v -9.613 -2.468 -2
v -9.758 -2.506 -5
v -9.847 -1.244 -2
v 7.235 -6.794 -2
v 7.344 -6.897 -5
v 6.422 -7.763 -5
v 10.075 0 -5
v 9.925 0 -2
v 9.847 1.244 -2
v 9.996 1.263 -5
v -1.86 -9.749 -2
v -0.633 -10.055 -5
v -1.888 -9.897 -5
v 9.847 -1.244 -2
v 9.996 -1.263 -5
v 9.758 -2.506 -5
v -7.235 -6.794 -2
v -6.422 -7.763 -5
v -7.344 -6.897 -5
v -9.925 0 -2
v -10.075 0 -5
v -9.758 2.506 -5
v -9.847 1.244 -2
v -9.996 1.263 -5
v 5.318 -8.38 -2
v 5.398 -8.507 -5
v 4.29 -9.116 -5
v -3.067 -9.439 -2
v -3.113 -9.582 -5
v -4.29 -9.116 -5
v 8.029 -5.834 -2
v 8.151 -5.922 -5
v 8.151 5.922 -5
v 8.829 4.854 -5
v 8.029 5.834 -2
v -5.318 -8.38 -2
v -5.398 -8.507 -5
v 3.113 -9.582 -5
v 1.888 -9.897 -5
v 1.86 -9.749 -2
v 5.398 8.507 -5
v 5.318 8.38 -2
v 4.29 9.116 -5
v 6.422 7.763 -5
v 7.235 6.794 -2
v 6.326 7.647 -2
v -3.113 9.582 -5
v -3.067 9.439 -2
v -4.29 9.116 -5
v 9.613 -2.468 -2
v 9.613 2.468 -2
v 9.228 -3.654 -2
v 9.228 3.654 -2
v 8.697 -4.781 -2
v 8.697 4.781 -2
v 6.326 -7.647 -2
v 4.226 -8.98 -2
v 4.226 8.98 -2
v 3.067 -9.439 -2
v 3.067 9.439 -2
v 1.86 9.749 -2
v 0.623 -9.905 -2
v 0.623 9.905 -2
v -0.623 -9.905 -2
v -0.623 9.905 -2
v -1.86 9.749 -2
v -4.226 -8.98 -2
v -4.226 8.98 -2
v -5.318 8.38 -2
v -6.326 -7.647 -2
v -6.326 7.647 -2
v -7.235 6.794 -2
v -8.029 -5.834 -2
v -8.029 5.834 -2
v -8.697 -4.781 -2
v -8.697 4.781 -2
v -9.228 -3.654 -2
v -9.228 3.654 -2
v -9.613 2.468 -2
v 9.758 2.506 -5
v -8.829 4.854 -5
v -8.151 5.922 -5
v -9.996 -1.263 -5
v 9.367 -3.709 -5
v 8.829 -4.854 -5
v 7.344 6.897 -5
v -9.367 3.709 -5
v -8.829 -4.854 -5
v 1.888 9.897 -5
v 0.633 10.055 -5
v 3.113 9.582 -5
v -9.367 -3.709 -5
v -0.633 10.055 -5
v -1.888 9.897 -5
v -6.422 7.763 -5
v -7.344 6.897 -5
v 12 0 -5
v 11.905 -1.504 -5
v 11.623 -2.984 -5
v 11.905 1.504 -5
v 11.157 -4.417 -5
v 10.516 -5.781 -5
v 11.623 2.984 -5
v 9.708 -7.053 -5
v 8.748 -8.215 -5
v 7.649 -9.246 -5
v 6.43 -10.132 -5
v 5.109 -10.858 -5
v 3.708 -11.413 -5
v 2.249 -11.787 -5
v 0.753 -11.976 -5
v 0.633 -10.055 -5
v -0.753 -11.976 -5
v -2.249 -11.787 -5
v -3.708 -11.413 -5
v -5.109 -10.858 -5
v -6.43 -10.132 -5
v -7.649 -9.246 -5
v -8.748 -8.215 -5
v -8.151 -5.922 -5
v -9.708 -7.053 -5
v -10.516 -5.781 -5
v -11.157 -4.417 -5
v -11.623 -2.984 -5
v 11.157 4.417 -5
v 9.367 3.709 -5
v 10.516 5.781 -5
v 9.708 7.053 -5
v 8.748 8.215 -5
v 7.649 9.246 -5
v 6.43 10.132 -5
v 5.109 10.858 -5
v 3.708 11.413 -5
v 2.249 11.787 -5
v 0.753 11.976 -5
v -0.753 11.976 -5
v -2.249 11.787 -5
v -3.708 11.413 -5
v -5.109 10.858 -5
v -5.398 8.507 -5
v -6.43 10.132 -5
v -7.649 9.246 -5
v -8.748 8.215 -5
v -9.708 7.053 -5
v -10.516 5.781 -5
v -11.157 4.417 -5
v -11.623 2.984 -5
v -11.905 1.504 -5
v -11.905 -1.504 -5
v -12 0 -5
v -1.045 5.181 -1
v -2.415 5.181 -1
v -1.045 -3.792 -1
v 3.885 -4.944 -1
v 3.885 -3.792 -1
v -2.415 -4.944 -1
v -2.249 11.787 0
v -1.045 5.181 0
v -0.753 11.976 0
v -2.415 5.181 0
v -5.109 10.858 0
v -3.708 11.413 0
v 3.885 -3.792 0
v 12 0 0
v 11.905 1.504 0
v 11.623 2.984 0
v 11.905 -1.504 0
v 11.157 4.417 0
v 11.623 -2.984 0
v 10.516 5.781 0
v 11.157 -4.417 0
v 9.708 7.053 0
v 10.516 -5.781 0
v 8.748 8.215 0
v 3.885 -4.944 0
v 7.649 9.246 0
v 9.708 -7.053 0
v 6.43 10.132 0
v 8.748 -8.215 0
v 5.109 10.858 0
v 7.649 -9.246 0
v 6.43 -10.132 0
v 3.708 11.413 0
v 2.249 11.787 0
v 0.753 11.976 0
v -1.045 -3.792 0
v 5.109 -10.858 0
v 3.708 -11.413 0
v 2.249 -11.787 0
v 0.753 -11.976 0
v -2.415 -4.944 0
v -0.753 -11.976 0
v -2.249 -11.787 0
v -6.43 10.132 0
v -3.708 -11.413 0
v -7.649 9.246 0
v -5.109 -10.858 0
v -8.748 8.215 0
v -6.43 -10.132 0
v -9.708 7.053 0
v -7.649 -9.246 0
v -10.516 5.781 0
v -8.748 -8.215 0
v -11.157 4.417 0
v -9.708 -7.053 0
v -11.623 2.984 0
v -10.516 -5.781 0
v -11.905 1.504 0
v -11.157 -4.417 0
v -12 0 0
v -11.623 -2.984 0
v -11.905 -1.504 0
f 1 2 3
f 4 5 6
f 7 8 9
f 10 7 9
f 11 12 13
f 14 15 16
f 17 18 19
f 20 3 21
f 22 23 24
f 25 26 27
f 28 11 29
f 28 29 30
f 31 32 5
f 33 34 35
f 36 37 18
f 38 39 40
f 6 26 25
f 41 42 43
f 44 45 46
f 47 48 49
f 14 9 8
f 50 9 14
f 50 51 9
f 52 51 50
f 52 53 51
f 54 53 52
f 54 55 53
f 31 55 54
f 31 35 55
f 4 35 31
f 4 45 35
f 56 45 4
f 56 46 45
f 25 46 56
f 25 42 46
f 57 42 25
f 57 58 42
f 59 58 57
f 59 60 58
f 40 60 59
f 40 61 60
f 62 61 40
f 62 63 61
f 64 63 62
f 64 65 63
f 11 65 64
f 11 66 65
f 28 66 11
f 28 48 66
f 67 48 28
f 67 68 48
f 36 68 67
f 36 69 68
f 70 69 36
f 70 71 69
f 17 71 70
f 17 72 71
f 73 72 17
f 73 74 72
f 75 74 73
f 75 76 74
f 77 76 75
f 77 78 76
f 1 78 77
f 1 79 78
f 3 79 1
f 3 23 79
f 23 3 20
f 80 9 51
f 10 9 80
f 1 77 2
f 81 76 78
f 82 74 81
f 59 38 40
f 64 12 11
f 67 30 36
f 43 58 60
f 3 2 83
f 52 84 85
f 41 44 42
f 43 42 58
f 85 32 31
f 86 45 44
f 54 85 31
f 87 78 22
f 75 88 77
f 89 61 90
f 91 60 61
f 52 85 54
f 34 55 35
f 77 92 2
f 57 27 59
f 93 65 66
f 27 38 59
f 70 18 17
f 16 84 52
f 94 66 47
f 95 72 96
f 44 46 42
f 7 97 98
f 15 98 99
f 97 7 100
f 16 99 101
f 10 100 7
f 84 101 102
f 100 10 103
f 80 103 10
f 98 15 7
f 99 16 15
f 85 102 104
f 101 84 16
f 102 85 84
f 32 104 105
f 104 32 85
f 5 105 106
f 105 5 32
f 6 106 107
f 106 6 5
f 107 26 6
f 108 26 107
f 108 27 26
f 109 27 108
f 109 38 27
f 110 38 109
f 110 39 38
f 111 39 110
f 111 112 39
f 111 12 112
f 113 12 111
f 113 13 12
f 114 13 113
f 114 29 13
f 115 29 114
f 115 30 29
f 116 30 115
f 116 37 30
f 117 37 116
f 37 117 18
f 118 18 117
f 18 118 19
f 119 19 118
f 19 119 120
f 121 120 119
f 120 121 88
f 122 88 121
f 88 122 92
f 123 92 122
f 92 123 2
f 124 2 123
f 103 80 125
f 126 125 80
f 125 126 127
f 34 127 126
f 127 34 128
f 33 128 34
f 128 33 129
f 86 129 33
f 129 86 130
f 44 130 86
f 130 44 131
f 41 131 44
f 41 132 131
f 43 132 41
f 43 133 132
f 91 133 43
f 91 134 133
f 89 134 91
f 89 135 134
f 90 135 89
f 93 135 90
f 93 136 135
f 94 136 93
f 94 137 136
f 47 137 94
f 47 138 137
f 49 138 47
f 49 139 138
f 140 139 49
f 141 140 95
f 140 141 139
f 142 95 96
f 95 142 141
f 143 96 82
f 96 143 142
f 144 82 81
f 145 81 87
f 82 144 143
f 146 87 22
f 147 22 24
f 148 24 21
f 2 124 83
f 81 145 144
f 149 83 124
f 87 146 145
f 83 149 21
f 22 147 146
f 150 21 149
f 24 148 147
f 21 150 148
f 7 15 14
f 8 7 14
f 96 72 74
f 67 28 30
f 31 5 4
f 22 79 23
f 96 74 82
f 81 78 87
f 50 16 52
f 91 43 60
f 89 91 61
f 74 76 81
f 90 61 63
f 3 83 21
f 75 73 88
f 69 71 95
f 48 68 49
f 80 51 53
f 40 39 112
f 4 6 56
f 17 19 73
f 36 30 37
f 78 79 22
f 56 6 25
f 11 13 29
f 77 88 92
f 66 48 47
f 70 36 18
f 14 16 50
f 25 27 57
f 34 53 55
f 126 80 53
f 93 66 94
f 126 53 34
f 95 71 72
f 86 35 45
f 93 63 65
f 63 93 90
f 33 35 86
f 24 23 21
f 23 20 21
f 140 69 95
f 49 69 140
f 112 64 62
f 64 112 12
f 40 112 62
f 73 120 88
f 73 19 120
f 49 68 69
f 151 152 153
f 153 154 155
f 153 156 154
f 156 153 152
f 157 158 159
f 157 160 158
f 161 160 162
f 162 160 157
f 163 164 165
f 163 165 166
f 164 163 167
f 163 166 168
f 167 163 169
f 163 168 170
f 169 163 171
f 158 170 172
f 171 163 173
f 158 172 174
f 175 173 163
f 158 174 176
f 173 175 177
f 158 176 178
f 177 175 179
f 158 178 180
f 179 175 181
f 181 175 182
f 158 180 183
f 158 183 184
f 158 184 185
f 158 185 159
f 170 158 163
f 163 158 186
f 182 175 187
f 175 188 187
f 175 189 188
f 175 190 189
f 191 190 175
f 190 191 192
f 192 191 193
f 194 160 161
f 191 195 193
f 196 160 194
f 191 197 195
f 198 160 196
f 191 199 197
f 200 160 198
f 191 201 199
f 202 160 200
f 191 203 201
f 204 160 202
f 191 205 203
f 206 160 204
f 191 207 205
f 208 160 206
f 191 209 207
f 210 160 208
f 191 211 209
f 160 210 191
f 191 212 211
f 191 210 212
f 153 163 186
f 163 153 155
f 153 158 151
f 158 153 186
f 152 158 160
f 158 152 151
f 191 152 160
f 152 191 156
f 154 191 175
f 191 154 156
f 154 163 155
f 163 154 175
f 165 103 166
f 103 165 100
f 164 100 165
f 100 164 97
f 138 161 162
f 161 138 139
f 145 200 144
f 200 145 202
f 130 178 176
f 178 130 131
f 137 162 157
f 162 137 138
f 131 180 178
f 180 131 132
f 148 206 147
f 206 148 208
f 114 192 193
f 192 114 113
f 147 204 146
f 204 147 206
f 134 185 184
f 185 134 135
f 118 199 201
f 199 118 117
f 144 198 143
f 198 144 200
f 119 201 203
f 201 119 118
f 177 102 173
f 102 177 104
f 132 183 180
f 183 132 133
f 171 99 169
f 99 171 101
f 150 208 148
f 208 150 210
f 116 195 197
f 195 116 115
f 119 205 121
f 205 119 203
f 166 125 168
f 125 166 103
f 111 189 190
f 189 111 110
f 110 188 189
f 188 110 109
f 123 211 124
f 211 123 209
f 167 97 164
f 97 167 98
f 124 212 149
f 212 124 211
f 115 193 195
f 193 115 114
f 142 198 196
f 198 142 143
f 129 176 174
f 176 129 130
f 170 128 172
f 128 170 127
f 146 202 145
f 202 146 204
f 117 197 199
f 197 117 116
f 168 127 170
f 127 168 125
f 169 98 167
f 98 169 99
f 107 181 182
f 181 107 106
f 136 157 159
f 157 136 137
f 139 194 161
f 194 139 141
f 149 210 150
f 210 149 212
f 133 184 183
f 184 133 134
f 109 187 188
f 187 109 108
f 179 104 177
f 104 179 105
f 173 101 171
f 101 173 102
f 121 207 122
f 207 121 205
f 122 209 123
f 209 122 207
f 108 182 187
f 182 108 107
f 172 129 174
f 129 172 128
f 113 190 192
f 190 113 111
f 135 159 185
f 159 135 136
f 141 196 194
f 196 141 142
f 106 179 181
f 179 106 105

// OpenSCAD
$fn = 50;

difference() {
	union() {
		translate(v = [0, 0, -5.0]) {
			cylinder(h = 5, r = 12.0);
		}
	}
	union() {
		#translate(v = [0, 0, -5.0]) {
			cylinder(h = 3, r1 = 10.075, r2 = 9.925);
		}
		translate(v = [0, 0, -1]) {
			linear_extrude(height = 1) {
				text(font = "Impact", halign = "center", size = 10, text = "L", valign = "center");
			}
		}
	}
}
